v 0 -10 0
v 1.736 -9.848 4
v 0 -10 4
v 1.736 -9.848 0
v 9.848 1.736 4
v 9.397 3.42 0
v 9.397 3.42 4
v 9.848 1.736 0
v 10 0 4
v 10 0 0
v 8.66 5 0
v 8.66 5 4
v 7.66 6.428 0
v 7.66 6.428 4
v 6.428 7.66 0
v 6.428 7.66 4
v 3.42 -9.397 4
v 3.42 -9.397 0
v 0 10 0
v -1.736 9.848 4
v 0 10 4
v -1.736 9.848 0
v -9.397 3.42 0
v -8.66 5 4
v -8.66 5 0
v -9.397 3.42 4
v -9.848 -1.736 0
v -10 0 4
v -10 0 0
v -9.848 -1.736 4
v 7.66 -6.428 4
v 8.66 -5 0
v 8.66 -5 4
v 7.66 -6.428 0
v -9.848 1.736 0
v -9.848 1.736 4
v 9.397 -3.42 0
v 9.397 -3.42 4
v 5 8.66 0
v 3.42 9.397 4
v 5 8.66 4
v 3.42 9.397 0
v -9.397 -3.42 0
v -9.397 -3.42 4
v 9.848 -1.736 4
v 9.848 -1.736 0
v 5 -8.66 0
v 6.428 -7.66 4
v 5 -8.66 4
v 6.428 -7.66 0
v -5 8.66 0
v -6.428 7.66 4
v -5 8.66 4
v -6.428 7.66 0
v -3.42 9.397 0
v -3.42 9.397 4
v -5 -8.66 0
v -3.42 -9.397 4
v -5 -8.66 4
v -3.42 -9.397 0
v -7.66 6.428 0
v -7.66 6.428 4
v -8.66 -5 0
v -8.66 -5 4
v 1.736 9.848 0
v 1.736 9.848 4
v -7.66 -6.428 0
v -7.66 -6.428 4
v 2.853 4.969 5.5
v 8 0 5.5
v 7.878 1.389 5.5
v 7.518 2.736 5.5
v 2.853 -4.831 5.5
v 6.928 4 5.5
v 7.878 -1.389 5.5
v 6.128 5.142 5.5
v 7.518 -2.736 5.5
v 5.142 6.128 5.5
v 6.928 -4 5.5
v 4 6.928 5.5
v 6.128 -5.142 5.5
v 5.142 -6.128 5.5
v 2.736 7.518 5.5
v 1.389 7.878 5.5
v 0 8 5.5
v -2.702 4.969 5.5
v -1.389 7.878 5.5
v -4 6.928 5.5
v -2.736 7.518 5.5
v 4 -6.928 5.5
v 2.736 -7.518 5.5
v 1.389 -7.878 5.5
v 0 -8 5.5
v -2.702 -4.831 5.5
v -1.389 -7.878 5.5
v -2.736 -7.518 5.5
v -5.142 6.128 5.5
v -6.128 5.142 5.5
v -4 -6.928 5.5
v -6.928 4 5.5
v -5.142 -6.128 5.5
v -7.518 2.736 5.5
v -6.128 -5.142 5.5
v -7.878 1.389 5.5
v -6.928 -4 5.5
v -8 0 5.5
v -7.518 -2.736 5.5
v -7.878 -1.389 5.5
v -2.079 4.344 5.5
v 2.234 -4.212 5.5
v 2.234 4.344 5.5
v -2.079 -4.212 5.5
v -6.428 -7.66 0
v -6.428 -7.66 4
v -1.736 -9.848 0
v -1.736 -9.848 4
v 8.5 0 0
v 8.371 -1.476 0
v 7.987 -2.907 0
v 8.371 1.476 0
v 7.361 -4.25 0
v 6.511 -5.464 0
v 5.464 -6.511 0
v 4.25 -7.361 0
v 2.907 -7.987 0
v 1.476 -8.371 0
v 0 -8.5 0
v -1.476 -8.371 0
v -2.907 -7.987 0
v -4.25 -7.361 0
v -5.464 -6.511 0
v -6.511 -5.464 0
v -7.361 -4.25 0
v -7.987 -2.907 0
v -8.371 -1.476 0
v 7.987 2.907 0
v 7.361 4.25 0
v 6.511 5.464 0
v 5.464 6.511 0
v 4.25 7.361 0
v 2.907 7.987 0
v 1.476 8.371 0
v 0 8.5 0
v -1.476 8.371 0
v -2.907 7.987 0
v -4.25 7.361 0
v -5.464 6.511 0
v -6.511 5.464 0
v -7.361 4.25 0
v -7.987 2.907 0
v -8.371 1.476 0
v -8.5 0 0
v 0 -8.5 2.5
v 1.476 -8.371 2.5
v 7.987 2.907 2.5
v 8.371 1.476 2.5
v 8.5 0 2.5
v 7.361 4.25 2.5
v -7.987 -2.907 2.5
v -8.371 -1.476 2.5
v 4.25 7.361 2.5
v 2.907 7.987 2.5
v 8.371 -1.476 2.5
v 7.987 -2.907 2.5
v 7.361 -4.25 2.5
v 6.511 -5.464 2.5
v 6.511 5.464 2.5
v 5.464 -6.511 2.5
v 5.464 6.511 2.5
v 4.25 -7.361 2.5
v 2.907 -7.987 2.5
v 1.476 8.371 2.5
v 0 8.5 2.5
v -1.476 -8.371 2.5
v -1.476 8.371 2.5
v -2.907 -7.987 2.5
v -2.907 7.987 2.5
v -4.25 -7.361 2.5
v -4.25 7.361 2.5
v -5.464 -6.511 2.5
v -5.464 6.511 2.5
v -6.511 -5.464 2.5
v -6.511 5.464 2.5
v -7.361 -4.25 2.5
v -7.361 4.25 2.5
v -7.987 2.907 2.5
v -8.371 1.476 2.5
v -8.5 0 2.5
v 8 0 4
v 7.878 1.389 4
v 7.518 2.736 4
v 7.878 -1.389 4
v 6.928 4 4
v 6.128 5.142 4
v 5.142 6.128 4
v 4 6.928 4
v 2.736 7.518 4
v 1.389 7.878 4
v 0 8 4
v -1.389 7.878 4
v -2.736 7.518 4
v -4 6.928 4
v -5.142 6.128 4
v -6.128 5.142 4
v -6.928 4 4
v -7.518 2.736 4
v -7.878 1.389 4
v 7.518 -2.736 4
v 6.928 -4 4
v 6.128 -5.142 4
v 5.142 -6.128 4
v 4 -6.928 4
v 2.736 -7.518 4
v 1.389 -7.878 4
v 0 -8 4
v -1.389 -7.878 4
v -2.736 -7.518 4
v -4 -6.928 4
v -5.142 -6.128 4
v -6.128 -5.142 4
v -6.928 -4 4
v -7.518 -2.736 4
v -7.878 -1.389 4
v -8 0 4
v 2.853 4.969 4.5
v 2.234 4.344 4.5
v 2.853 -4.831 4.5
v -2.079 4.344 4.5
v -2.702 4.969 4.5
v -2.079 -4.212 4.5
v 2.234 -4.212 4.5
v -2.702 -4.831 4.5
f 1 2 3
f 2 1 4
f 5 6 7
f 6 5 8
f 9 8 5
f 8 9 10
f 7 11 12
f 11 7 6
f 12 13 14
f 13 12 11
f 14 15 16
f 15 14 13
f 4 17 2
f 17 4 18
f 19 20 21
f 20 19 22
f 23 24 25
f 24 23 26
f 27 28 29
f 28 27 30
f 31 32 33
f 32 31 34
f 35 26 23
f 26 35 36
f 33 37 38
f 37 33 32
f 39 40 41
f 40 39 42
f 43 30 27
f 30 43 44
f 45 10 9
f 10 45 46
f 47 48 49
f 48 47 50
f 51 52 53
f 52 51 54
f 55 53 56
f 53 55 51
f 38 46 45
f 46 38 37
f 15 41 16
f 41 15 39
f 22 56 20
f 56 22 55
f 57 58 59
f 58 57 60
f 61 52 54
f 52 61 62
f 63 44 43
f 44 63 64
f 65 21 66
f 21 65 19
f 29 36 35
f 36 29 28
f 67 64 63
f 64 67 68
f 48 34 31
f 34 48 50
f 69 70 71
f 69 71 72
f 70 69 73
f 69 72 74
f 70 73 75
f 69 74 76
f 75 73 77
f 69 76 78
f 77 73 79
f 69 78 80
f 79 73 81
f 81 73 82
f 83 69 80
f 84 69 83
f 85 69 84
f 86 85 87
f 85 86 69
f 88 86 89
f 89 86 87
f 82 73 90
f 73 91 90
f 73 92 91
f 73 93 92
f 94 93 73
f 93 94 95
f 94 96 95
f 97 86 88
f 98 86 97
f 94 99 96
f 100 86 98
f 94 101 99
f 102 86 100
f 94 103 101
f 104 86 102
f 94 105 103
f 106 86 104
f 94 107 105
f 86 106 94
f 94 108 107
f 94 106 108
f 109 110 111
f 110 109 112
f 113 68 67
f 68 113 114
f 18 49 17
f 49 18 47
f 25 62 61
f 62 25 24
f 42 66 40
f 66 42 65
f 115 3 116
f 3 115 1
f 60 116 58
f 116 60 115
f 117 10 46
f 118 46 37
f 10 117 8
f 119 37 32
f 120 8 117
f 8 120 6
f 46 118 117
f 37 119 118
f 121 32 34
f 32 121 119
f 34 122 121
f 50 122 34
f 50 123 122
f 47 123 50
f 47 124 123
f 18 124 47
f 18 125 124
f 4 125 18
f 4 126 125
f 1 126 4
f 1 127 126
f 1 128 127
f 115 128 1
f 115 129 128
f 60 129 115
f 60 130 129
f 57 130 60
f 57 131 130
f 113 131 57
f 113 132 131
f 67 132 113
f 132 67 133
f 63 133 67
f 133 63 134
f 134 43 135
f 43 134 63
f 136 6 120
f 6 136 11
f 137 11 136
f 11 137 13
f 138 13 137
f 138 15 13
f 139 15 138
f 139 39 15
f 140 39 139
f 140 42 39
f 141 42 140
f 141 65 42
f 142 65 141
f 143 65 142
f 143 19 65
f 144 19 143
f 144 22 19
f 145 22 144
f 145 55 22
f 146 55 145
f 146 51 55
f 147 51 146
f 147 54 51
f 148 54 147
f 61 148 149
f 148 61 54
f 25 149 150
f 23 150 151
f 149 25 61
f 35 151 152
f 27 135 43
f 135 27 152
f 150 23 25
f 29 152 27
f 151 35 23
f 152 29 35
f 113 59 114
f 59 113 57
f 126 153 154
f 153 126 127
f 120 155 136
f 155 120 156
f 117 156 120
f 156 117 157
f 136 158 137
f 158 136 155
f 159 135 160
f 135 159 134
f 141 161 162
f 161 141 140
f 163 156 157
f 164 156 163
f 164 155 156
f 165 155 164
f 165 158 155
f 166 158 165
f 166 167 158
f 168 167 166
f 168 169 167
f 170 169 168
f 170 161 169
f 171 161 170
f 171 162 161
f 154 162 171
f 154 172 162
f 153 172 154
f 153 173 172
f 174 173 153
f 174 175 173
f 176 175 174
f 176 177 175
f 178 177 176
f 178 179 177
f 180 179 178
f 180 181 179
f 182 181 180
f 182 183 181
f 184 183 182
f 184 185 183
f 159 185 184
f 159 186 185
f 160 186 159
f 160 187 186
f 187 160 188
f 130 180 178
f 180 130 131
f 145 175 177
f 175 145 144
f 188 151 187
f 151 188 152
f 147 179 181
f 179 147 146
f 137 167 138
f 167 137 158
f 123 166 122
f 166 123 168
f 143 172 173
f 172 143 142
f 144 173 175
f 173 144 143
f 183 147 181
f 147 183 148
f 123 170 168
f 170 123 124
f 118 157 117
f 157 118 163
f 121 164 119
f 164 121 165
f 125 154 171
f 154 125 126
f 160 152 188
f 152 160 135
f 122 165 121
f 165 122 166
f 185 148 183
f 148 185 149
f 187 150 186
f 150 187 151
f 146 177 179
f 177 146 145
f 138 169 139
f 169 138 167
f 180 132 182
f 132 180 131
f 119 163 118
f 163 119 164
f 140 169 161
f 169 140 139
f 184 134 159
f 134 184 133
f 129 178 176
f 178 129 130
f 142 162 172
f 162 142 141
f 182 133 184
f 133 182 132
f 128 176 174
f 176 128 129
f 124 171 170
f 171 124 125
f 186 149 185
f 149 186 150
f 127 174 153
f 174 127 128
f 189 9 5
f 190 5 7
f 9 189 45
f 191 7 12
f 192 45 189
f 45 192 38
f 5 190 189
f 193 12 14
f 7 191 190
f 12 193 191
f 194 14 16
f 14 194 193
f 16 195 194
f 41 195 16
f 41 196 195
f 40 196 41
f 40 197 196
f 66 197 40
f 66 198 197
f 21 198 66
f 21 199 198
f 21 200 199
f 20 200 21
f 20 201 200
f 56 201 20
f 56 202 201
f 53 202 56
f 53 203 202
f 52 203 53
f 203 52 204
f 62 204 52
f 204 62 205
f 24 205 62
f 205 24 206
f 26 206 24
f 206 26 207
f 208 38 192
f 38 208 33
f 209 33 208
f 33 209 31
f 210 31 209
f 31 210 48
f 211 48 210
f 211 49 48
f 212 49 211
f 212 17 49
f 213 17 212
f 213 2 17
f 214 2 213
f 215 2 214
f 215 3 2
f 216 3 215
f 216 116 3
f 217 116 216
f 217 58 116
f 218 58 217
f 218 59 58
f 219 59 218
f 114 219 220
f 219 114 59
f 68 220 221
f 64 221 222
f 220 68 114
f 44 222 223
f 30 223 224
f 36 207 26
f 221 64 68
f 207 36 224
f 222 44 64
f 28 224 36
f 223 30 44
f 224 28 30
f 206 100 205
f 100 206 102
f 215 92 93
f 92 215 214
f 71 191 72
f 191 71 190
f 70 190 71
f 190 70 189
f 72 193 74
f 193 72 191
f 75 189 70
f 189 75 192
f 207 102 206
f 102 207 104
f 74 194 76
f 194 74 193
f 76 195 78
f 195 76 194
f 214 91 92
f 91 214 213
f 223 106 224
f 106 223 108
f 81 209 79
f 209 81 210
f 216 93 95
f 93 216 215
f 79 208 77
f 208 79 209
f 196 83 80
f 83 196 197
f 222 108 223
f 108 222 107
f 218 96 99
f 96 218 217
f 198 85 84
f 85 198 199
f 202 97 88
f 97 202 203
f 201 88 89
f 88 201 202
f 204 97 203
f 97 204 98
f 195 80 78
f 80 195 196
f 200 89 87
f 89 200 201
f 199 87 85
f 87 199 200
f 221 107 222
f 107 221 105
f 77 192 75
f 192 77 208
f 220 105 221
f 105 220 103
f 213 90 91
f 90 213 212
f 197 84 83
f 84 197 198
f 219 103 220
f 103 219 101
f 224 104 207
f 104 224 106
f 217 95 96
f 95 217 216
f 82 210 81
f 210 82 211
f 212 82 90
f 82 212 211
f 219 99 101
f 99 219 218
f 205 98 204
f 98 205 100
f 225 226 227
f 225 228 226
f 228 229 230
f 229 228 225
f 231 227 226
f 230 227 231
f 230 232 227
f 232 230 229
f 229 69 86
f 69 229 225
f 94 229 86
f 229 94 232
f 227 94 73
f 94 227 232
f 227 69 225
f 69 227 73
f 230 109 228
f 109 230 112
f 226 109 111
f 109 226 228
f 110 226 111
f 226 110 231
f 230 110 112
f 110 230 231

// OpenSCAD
difference() {
	difference() {
		difference() {
			cylinder($fn = 36, h = 5.5000000000, r = 10);
			translate(v = [0, 0, -1]) {
				cylinder($fn = 36, h = 3.5000000000, r = 8.5000000000);
			}
		}
		translate(v = [0, 0, 4]) {
			difference() {
				cylinder($fn = 36, h = 3, r = 10.5000000000);
				cylinder($fn = 36, h = 3, r = 8);
			}
		}
	}
	translate(v = [0, 0, 4.5000000000]) {
		linear_extrude(height = 3) {
			text(font = "mana", halign = "center", size = 8, text = "\uE604", valign = "center");
		}
	}
}
